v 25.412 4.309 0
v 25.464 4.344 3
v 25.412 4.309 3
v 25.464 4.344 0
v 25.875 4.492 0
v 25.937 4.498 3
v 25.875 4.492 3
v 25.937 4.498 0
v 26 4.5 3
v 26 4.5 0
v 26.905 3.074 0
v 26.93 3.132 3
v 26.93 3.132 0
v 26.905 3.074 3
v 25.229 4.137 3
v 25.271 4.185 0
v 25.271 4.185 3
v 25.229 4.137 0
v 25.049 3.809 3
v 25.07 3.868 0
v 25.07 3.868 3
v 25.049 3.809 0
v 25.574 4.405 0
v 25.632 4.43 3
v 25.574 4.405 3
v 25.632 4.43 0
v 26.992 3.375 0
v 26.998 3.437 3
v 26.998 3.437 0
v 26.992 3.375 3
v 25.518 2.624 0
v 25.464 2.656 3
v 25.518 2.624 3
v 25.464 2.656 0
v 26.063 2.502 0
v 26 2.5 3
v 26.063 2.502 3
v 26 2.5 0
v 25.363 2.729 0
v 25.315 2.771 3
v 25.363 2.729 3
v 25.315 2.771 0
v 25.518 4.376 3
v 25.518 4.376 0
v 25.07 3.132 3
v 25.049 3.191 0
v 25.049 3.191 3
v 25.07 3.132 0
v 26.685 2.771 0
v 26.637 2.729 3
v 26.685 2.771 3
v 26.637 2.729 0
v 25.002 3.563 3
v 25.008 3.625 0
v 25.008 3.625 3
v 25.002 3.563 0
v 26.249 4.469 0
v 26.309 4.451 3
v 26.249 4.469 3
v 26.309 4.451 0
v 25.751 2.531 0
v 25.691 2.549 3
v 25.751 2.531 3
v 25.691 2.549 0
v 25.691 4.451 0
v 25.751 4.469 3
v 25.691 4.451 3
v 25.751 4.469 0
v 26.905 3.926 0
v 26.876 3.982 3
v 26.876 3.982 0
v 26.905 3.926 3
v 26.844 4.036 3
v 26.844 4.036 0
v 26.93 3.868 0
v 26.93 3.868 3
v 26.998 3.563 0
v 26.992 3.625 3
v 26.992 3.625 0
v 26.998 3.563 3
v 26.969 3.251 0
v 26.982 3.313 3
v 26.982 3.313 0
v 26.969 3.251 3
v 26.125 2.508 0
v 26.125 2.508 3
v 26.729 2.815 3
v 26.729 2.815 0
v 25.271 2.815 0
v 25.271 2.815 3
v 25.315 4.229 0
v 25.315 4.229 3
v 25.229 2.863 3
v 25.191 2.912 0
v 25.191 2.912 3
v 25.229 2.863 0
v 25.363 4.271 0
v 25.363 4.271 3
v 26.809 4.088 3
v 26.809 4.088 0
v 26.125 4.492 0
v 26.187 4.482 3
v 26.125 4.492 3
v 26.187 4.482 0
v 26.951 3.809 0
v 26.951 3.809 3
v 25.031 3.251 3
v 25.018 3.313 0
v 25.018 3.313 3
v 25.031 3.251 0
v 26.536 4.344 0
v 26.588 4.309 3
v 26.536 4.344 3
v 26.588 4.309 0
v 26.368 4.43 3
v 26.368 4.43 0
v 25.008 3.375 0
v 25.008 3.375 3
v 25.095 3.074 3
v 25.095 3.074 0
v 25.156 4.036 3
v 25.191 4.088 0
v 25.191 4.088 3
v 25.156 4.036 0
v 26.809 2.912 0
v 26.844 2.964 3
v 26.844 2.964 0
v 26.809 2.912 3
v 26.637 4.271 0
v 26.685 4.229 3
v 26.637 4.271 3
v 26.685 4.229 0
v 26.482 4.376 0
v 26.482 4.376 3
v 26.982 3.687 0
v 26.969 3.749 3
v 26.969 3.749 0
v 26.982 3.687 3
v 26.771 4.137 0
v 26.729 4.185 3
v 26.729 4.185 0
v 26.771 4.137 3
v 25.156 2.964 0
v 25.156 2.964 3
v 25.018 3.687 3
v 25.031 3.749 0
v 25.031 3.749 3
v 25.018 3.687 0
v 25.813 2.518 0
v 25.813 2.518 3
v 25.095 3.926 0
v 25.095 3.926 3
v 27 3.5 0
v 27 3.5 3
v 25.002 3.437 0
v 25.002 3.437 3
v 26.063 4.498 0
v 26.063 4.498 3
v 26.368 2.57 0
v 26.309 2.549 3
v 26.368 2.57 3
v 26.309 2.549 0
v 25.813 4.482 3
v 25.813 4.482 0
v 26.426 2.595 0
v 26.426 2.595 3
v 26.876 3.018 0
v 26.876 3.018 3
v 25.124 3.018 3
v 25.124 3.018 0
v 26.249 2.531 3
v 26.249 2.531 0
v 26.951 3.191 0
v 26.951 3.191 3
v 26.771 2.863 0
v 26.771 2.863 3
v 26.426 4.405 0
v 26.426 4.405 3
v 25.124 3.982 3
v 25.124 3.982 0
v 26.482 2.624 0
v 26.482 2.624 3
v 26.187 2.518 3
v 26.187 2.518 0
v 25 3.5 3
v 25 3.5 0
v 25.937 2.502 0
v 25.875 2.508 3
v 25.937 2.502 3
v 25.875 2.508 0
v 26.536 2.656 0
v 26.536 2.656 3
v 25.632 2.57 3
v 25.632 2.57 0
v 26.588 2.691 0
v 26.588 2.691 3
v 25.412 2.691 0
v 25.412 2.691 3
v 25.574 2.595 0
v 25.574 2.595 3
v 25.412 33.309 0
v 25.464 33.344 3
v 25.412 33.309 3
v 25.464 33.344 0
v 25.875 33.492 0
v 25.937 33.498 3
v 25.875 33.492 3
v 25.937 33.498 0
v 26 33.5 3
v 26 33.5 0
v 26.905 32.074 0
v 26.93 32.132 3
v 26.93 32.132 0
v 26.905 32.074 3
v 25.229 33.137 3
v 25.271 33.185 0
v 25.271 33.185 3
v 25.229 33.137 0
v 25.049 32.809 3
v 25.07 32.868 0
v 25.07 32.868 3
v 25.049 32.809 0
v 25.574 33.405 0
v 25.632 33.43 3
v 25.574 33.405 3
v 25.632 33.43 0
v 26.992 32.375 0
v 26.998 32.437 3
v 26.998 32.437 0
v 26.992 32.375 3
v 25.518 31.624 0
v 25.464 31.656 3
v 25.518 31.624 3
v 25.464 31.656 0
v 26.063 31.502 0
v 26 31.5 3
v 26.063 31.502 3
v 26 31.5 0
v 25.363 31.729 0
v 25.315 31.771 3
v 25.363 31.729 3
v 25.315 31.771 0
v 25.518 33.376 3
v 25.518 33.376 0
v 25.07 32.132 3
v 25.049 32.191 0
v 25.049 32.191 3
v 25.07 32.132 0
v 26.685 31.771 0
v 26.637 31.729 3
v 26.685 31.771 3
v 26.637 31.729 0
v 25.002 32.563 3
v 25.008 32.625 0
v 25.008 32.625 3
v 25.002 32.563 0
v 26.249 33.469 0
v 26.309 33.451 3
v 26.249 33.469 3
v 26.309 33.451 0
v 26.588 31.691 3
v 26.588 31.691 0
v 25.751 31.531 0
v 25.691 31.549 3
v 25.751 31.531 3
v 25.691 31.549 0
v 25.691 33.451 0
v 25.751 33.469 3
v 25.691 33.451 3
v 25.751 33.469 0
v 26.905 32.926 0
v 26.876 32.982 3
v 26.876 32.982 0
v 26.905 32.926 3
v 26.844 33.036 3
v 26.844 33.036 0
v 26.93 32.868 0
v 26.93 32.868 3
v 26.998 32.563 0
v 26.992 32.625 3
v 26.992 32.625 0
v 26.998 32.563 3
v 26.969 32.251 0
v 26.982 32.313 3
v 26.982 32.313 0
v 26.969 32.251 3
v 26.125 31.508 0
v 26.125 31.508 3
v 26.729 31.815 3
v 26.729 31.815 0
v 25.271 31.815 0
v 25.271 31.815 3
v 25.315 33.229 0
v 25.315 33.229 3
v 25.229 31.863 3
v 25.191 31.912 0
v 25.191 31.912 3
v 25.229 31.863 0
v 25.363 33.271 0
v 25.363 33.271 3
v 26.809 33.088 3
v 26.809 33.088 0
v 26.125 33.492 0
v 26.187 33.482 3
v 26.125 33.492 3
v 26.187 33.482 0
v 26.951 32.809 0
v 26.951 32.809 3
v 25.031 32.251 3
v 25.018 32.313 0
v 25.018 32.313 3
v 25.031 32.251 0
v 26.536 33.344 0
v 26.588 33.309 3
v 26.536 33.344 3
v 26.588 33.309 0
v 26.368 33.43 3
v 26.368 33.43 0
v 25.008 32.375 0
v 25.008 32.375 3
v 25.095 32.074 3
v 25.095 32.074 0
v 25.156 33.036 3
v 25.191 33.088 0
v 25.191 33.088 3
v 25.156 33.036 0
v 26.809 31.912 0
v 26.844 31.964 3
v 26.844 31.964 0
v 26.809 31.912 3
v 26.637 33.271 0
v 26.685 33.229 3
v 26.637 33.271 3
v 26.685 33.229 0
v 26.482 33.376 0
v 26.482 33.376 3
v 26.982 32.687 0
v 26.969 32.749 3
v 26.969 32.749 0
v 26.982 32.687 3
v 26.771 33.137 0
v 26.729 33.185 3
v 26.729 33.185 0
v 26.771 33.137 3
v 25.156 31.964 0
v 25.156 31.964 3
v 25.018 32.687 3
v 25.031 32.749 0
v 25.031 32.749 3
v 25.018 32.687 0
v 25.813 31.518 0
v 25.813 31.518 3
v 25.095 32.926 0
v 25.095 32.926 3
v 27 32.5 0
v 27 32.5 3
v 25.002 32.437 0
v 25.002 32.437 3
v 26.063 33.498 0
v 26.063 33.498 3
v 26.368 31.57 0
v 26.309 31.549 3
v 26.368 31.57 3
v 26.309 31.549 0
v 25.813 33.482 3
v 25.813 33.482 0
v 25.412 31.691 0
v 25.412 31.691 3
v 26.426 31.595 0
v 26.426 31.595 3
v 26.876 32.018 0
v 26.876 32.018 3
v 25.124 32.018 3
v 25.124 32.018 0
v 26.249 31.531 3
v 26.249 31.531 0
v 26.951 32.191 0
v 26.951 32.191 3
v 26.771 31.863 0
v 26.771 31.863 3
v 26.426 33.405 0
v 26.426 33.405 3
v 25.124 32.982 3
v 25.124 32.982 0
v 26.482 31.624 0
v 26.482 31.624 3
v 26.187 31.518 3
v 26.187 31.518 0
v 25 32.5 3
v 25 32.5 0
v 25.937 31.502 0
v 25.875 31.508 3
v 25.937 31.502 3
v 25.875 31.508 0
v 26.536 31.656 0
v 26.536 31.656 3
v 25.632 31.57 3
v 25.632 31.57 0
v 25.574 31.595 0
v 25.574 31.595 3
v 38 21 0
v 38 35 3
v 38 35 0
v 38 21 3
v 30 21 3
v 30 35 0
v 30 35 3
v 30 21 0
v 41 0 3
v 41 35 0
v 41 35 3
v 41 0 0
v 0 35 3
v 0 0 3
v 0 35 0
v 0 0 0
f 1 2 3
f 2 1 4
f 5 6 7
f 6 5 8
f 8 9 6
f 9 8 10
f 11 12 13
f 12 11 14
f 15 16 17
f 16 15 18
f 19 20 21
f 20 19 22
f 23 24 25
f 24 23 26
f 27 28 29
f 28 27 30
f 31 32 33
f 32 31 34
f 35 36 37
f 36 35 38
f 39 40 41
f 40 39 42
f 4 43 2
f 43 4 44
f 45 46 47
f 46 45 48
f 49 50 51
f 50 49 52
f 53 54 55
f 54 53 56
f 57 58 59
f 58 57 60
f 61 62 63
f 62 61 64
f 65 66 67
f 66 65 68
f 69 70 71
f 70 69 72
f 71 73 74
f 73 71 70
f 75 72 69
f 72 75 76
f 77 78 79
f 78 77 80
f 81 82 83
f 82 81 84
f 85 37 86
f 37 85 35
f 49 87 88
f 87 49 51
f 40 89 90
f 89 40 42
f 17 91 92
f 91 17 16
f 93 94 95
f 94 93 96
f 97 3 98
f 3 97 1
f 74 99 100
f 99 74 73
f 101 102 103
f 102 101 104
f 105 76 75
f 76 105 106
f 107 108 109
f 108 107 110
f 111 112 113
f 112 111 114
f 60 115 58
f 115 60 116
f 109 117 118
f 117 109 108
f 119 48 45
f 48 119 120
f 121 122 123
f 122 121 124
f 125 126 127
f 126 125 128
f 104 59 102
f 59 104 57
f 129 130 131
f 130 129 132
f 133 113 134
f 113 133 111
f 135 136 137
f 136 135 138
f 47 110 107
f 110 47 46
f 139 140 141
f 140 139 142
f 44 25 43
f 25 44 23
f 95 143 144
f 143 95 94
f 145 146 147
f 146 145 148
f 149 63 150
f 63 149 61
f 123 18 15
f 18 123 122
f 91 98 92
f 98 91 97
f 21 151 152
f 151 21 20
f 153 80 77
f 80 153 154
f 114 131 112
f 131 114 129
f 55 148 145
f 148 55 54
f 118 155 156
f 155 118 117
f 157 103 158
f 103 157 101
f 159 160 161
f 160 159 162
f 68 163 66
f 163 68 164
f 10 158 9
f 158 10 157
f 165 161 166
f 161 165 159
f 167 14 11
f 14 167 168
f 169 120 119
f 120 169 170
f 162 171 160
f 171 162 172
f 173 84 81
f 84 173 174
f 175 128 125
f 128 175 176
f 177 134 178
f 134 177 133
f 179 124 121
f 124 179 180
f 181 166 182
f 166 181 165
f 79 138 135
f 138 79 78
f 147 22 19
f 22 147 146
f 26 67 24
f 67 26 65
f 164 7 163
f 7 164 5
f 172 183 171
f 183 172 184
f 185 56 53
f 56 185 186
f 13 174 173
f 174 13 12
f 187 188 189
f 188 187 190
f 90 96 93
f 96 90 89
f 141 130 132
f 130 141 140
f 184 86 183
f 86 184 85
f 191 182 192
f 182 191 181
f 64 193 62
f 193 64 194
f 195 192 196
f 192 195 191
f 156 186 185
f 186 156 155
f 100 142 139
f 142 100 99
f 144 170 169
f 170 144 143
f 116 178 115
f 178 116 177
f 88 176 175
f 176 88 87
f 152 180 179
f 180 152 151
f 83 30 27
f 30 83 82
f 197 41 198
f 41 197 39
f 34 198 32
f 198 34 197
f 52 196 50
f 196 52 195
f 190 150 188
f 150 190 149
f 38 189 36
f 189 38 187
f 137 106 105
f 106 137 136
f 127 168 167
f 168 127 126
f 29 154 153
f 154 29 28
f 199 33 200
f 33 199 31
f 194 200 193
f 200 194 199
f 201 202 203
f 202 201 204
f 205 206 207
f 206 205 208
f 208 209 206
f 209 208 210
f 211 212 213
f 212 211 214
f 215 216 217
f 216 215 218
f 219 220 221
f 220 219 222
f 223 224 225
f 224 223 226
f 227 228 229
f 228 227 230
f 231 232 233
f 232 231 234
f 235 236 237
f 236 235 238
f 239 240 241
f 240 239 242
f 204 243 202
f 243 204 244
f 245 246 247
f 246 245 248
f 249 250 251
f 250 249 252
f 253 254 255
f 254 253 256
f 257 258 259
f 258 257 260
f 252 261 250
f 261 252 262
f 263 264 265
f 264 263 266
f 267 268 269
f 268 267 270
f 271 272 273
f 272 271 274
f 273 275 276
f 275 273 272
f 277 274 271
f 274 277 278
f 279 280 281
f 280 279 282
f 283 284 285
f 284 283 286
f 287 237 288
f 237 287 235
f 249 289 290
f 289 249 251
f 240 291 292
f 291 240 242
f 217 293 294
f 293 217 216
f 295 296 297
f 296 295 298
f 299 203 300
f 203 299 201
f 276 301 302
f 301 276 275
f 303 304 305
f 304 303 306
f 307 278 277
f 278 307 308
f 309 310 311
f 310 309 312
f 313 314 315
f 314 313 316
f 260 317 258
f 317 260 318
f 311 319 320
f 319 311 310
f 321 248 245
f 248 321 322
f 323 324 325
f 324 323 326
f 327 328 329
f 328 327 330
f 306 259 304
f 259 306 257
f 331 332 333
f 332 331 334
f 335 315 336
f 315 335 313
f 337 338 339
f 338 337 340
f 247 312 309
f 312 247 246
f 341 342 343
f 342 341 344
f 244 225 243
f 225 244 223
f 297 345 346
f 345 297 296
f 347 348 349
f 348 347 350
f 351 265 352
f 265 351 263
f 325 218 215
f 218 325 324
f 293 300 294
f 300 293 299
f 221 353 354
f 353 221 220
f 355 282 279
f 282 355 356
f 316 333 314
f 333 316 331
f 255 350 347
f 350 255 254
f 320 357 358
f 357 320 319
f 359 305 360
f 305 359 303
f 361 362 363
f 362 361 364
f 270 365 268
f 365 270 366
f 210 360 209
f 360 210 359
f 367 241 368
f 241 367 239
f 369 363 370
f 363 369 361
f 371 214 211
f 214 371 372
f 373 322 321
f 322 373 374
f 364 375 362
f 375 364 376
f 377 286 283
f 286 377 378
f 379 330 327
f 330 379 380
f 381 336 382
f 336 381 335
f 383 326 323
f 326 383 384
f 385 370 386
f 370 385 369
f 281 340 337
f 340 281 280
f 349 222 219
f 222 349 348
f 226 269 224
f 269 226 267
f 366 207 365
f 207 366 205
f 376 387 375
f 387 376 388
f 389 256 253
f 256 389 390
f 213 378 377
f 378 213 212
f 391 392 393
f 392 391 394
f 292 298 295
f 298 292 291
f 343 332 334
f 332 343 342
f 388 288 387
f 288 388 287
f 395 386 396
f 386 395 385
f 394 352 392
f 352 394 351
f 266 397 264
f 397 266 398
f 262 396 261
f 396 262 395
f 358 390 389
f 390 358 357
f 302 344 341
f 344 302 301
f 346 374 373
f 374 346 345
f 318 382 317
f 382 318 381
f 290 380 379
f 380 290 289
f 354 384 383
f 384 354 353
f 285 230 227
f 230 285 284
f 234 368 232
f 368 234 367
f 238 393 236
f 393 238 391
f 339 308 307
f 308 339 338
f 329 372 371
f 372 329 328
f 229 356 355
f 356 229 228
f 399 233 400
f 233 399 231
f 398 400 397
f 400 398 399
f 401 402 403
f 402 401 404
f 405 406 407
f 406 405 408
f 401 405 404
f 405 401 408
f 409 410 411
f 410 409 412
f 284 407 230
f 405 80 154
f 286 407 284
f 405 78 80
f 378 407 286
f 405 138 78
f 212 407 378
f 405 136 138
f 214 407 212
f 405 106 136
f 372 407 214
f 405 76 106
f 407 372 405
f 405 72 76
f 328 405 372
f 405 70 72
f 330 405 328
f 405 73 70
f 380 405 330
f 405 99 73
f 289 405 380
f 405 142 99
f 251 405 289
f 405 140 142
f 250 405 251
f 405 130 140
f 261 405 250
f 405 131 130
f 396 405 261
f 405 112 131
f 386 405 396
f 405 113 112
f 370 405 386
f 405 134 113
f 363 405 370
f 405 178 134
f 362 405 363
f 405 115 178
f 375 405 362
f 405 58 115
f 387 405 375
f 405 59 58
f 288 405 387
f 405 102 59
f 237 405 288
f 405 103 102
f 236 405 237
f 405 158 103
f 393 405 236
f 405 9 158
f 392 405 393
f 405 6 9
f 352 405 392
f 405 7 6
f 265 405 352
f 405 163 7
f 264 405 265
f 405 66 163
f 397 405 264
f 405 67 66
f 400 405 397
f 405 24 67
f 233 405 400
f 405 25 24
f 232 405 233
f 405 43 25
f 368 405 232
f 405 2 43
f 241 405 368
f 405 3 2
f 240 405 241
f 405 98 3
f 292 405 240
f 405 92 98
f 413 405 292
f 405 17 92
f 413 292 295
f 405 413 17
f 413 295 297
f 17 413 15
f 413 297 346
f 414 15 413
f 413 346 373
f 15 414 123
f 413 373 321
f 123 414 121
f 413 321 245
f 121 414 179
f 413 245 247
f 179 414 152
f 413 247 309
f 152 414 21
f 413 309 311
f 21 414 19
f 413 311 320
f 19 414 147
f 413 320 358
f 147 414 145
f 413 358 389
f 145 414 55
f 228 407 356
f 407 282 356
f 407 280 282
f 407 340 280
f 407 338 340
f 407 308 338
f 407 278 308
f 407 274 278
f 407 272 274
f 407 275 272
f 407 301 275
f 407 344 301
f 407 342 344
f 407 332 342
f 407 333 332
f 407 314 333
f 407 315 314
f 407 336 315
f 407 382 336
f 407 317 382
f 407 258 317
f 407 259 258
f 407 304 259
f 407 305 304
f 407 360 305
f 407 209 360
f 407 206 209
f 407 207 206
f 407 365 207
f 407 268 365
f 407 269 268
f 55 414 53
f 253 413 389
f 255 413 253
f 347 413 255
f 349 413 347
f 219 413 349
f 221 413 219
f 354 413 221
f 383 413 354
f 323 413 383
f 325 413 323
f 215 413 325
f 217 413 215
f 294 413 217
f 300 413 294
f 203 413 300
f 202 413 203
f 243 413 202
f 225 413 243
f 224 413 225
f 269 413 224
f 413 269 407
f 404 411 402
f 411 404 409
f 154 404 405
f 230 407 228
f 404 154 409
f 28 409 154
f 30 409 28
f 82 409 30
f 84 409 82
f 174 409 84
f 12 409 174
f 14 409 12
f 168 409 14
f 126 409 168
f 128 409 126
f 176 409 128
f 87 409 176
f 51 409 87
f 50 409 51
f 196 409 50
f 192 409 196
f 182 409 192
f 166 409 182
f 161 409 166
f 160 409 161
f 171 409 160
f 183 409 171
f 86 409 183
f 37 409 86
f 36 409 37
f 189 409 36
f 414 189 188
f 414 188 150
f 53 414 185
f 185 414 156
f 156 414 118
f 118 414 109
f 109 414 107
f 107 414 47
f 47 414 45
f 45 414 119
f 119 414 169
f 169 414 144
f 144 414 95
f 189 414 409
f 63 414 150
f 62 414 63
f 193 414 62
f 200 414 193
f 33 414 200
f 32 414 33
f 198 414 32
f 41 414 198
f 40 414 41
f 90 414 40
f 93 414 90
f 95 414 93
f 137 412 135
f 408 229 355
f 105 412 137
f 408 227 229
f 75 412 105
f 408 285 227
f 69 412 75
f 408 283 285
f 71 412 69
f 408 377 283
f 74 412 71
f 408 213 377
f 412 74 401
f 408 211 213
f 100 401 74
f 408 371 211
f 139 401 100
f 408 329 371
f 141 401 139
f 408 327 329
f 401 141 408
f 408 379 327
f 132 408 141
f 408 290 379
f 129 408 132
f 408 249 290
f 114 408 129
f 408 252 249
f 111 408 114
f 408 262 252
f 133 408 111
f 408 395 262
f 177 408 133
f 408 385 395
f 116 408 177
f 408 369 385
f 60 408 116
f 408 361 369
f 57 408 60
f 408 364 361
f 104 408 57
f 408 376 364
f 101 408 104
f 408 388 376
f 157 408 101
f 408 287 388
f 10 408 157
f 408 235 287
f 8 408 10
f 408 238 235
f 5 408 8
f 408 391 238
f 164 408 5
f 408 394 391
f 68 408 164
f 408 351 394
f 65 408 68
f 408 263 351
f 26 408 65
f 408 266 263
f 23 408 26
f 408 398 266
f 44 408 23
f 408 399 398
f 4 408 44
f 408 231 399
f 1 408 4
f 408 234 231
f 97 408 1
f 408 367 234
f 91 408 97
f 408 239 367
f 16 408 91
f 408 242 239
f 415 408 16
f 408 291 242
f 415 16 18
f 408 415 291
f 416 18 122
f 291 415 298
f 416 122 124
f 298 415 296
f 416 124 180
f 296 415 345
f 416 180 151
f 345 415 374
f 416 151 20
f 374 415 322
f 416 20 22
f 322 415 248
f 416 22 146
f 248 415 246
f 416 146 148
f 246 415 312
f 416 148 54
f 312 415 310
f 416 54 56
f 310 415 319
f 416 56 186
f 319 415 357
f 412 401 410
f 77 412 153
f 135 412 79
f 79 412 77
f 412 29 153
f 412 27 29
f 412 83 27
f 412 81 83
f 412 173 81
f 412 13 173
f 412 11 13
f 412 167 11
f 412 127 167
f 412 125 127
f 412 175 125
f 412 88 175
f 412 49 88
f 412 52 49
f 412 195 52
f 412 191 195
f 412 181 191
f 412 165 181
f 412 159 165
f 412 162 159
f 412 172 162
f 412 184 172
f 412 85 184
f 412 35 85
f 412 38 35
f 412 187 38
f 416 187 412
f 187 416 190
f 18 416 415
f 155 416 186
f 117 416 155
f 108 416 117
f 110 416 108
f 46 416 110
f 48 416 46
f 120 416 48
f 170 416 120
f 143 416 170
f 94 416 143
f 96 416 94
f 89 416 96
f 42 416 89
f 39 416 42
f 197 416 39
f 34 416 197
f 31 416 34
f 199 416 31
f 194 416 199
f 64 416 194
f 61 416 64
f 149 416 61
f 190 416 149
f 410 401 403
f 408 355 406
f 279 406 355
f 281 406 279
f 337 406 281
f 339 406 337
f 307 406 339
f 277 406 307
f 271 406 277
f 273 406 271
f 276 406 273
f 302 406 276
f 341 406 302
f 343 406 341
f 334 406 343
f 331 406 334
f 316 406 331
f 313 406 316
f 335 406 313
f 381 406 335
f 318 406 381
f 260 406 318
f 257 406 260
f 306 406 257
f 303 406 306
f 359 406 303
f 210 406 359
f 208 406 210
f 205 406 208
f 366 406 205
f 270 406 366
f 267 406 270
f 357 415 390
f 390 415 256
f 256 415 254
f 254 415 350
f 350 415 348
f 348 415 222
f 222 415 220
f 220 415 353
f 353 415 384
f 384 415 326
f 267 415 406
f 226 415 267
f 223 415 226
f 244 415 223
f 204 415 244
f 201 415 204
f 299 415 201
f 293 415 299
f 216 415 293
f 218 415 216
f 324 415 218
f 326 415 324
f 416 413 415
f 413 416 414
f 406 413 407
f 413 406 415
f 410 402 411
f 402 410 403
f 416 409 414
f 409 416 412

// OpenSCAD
difference(){
	union(){
        
        translate([0,0,0]){
           cube([41,35,3], center=false);
        }    

	}
	union() {
		   
       translate([26,3.5,0]){
            rotate(a = [0,0,90]) {
                cylinder(h=600, r=1, $fn=100, center=true);
            }
       }			   
       translate([26,35-2.5,0]){
            rotate(a = [0,0,90]) {
                cylinder(h=600, r=1, $fn=100, center=true);
            }
       }	
       translate([30,21,-4]){
          cube([8,15,8], center=false);
        }      

        
	}
}
